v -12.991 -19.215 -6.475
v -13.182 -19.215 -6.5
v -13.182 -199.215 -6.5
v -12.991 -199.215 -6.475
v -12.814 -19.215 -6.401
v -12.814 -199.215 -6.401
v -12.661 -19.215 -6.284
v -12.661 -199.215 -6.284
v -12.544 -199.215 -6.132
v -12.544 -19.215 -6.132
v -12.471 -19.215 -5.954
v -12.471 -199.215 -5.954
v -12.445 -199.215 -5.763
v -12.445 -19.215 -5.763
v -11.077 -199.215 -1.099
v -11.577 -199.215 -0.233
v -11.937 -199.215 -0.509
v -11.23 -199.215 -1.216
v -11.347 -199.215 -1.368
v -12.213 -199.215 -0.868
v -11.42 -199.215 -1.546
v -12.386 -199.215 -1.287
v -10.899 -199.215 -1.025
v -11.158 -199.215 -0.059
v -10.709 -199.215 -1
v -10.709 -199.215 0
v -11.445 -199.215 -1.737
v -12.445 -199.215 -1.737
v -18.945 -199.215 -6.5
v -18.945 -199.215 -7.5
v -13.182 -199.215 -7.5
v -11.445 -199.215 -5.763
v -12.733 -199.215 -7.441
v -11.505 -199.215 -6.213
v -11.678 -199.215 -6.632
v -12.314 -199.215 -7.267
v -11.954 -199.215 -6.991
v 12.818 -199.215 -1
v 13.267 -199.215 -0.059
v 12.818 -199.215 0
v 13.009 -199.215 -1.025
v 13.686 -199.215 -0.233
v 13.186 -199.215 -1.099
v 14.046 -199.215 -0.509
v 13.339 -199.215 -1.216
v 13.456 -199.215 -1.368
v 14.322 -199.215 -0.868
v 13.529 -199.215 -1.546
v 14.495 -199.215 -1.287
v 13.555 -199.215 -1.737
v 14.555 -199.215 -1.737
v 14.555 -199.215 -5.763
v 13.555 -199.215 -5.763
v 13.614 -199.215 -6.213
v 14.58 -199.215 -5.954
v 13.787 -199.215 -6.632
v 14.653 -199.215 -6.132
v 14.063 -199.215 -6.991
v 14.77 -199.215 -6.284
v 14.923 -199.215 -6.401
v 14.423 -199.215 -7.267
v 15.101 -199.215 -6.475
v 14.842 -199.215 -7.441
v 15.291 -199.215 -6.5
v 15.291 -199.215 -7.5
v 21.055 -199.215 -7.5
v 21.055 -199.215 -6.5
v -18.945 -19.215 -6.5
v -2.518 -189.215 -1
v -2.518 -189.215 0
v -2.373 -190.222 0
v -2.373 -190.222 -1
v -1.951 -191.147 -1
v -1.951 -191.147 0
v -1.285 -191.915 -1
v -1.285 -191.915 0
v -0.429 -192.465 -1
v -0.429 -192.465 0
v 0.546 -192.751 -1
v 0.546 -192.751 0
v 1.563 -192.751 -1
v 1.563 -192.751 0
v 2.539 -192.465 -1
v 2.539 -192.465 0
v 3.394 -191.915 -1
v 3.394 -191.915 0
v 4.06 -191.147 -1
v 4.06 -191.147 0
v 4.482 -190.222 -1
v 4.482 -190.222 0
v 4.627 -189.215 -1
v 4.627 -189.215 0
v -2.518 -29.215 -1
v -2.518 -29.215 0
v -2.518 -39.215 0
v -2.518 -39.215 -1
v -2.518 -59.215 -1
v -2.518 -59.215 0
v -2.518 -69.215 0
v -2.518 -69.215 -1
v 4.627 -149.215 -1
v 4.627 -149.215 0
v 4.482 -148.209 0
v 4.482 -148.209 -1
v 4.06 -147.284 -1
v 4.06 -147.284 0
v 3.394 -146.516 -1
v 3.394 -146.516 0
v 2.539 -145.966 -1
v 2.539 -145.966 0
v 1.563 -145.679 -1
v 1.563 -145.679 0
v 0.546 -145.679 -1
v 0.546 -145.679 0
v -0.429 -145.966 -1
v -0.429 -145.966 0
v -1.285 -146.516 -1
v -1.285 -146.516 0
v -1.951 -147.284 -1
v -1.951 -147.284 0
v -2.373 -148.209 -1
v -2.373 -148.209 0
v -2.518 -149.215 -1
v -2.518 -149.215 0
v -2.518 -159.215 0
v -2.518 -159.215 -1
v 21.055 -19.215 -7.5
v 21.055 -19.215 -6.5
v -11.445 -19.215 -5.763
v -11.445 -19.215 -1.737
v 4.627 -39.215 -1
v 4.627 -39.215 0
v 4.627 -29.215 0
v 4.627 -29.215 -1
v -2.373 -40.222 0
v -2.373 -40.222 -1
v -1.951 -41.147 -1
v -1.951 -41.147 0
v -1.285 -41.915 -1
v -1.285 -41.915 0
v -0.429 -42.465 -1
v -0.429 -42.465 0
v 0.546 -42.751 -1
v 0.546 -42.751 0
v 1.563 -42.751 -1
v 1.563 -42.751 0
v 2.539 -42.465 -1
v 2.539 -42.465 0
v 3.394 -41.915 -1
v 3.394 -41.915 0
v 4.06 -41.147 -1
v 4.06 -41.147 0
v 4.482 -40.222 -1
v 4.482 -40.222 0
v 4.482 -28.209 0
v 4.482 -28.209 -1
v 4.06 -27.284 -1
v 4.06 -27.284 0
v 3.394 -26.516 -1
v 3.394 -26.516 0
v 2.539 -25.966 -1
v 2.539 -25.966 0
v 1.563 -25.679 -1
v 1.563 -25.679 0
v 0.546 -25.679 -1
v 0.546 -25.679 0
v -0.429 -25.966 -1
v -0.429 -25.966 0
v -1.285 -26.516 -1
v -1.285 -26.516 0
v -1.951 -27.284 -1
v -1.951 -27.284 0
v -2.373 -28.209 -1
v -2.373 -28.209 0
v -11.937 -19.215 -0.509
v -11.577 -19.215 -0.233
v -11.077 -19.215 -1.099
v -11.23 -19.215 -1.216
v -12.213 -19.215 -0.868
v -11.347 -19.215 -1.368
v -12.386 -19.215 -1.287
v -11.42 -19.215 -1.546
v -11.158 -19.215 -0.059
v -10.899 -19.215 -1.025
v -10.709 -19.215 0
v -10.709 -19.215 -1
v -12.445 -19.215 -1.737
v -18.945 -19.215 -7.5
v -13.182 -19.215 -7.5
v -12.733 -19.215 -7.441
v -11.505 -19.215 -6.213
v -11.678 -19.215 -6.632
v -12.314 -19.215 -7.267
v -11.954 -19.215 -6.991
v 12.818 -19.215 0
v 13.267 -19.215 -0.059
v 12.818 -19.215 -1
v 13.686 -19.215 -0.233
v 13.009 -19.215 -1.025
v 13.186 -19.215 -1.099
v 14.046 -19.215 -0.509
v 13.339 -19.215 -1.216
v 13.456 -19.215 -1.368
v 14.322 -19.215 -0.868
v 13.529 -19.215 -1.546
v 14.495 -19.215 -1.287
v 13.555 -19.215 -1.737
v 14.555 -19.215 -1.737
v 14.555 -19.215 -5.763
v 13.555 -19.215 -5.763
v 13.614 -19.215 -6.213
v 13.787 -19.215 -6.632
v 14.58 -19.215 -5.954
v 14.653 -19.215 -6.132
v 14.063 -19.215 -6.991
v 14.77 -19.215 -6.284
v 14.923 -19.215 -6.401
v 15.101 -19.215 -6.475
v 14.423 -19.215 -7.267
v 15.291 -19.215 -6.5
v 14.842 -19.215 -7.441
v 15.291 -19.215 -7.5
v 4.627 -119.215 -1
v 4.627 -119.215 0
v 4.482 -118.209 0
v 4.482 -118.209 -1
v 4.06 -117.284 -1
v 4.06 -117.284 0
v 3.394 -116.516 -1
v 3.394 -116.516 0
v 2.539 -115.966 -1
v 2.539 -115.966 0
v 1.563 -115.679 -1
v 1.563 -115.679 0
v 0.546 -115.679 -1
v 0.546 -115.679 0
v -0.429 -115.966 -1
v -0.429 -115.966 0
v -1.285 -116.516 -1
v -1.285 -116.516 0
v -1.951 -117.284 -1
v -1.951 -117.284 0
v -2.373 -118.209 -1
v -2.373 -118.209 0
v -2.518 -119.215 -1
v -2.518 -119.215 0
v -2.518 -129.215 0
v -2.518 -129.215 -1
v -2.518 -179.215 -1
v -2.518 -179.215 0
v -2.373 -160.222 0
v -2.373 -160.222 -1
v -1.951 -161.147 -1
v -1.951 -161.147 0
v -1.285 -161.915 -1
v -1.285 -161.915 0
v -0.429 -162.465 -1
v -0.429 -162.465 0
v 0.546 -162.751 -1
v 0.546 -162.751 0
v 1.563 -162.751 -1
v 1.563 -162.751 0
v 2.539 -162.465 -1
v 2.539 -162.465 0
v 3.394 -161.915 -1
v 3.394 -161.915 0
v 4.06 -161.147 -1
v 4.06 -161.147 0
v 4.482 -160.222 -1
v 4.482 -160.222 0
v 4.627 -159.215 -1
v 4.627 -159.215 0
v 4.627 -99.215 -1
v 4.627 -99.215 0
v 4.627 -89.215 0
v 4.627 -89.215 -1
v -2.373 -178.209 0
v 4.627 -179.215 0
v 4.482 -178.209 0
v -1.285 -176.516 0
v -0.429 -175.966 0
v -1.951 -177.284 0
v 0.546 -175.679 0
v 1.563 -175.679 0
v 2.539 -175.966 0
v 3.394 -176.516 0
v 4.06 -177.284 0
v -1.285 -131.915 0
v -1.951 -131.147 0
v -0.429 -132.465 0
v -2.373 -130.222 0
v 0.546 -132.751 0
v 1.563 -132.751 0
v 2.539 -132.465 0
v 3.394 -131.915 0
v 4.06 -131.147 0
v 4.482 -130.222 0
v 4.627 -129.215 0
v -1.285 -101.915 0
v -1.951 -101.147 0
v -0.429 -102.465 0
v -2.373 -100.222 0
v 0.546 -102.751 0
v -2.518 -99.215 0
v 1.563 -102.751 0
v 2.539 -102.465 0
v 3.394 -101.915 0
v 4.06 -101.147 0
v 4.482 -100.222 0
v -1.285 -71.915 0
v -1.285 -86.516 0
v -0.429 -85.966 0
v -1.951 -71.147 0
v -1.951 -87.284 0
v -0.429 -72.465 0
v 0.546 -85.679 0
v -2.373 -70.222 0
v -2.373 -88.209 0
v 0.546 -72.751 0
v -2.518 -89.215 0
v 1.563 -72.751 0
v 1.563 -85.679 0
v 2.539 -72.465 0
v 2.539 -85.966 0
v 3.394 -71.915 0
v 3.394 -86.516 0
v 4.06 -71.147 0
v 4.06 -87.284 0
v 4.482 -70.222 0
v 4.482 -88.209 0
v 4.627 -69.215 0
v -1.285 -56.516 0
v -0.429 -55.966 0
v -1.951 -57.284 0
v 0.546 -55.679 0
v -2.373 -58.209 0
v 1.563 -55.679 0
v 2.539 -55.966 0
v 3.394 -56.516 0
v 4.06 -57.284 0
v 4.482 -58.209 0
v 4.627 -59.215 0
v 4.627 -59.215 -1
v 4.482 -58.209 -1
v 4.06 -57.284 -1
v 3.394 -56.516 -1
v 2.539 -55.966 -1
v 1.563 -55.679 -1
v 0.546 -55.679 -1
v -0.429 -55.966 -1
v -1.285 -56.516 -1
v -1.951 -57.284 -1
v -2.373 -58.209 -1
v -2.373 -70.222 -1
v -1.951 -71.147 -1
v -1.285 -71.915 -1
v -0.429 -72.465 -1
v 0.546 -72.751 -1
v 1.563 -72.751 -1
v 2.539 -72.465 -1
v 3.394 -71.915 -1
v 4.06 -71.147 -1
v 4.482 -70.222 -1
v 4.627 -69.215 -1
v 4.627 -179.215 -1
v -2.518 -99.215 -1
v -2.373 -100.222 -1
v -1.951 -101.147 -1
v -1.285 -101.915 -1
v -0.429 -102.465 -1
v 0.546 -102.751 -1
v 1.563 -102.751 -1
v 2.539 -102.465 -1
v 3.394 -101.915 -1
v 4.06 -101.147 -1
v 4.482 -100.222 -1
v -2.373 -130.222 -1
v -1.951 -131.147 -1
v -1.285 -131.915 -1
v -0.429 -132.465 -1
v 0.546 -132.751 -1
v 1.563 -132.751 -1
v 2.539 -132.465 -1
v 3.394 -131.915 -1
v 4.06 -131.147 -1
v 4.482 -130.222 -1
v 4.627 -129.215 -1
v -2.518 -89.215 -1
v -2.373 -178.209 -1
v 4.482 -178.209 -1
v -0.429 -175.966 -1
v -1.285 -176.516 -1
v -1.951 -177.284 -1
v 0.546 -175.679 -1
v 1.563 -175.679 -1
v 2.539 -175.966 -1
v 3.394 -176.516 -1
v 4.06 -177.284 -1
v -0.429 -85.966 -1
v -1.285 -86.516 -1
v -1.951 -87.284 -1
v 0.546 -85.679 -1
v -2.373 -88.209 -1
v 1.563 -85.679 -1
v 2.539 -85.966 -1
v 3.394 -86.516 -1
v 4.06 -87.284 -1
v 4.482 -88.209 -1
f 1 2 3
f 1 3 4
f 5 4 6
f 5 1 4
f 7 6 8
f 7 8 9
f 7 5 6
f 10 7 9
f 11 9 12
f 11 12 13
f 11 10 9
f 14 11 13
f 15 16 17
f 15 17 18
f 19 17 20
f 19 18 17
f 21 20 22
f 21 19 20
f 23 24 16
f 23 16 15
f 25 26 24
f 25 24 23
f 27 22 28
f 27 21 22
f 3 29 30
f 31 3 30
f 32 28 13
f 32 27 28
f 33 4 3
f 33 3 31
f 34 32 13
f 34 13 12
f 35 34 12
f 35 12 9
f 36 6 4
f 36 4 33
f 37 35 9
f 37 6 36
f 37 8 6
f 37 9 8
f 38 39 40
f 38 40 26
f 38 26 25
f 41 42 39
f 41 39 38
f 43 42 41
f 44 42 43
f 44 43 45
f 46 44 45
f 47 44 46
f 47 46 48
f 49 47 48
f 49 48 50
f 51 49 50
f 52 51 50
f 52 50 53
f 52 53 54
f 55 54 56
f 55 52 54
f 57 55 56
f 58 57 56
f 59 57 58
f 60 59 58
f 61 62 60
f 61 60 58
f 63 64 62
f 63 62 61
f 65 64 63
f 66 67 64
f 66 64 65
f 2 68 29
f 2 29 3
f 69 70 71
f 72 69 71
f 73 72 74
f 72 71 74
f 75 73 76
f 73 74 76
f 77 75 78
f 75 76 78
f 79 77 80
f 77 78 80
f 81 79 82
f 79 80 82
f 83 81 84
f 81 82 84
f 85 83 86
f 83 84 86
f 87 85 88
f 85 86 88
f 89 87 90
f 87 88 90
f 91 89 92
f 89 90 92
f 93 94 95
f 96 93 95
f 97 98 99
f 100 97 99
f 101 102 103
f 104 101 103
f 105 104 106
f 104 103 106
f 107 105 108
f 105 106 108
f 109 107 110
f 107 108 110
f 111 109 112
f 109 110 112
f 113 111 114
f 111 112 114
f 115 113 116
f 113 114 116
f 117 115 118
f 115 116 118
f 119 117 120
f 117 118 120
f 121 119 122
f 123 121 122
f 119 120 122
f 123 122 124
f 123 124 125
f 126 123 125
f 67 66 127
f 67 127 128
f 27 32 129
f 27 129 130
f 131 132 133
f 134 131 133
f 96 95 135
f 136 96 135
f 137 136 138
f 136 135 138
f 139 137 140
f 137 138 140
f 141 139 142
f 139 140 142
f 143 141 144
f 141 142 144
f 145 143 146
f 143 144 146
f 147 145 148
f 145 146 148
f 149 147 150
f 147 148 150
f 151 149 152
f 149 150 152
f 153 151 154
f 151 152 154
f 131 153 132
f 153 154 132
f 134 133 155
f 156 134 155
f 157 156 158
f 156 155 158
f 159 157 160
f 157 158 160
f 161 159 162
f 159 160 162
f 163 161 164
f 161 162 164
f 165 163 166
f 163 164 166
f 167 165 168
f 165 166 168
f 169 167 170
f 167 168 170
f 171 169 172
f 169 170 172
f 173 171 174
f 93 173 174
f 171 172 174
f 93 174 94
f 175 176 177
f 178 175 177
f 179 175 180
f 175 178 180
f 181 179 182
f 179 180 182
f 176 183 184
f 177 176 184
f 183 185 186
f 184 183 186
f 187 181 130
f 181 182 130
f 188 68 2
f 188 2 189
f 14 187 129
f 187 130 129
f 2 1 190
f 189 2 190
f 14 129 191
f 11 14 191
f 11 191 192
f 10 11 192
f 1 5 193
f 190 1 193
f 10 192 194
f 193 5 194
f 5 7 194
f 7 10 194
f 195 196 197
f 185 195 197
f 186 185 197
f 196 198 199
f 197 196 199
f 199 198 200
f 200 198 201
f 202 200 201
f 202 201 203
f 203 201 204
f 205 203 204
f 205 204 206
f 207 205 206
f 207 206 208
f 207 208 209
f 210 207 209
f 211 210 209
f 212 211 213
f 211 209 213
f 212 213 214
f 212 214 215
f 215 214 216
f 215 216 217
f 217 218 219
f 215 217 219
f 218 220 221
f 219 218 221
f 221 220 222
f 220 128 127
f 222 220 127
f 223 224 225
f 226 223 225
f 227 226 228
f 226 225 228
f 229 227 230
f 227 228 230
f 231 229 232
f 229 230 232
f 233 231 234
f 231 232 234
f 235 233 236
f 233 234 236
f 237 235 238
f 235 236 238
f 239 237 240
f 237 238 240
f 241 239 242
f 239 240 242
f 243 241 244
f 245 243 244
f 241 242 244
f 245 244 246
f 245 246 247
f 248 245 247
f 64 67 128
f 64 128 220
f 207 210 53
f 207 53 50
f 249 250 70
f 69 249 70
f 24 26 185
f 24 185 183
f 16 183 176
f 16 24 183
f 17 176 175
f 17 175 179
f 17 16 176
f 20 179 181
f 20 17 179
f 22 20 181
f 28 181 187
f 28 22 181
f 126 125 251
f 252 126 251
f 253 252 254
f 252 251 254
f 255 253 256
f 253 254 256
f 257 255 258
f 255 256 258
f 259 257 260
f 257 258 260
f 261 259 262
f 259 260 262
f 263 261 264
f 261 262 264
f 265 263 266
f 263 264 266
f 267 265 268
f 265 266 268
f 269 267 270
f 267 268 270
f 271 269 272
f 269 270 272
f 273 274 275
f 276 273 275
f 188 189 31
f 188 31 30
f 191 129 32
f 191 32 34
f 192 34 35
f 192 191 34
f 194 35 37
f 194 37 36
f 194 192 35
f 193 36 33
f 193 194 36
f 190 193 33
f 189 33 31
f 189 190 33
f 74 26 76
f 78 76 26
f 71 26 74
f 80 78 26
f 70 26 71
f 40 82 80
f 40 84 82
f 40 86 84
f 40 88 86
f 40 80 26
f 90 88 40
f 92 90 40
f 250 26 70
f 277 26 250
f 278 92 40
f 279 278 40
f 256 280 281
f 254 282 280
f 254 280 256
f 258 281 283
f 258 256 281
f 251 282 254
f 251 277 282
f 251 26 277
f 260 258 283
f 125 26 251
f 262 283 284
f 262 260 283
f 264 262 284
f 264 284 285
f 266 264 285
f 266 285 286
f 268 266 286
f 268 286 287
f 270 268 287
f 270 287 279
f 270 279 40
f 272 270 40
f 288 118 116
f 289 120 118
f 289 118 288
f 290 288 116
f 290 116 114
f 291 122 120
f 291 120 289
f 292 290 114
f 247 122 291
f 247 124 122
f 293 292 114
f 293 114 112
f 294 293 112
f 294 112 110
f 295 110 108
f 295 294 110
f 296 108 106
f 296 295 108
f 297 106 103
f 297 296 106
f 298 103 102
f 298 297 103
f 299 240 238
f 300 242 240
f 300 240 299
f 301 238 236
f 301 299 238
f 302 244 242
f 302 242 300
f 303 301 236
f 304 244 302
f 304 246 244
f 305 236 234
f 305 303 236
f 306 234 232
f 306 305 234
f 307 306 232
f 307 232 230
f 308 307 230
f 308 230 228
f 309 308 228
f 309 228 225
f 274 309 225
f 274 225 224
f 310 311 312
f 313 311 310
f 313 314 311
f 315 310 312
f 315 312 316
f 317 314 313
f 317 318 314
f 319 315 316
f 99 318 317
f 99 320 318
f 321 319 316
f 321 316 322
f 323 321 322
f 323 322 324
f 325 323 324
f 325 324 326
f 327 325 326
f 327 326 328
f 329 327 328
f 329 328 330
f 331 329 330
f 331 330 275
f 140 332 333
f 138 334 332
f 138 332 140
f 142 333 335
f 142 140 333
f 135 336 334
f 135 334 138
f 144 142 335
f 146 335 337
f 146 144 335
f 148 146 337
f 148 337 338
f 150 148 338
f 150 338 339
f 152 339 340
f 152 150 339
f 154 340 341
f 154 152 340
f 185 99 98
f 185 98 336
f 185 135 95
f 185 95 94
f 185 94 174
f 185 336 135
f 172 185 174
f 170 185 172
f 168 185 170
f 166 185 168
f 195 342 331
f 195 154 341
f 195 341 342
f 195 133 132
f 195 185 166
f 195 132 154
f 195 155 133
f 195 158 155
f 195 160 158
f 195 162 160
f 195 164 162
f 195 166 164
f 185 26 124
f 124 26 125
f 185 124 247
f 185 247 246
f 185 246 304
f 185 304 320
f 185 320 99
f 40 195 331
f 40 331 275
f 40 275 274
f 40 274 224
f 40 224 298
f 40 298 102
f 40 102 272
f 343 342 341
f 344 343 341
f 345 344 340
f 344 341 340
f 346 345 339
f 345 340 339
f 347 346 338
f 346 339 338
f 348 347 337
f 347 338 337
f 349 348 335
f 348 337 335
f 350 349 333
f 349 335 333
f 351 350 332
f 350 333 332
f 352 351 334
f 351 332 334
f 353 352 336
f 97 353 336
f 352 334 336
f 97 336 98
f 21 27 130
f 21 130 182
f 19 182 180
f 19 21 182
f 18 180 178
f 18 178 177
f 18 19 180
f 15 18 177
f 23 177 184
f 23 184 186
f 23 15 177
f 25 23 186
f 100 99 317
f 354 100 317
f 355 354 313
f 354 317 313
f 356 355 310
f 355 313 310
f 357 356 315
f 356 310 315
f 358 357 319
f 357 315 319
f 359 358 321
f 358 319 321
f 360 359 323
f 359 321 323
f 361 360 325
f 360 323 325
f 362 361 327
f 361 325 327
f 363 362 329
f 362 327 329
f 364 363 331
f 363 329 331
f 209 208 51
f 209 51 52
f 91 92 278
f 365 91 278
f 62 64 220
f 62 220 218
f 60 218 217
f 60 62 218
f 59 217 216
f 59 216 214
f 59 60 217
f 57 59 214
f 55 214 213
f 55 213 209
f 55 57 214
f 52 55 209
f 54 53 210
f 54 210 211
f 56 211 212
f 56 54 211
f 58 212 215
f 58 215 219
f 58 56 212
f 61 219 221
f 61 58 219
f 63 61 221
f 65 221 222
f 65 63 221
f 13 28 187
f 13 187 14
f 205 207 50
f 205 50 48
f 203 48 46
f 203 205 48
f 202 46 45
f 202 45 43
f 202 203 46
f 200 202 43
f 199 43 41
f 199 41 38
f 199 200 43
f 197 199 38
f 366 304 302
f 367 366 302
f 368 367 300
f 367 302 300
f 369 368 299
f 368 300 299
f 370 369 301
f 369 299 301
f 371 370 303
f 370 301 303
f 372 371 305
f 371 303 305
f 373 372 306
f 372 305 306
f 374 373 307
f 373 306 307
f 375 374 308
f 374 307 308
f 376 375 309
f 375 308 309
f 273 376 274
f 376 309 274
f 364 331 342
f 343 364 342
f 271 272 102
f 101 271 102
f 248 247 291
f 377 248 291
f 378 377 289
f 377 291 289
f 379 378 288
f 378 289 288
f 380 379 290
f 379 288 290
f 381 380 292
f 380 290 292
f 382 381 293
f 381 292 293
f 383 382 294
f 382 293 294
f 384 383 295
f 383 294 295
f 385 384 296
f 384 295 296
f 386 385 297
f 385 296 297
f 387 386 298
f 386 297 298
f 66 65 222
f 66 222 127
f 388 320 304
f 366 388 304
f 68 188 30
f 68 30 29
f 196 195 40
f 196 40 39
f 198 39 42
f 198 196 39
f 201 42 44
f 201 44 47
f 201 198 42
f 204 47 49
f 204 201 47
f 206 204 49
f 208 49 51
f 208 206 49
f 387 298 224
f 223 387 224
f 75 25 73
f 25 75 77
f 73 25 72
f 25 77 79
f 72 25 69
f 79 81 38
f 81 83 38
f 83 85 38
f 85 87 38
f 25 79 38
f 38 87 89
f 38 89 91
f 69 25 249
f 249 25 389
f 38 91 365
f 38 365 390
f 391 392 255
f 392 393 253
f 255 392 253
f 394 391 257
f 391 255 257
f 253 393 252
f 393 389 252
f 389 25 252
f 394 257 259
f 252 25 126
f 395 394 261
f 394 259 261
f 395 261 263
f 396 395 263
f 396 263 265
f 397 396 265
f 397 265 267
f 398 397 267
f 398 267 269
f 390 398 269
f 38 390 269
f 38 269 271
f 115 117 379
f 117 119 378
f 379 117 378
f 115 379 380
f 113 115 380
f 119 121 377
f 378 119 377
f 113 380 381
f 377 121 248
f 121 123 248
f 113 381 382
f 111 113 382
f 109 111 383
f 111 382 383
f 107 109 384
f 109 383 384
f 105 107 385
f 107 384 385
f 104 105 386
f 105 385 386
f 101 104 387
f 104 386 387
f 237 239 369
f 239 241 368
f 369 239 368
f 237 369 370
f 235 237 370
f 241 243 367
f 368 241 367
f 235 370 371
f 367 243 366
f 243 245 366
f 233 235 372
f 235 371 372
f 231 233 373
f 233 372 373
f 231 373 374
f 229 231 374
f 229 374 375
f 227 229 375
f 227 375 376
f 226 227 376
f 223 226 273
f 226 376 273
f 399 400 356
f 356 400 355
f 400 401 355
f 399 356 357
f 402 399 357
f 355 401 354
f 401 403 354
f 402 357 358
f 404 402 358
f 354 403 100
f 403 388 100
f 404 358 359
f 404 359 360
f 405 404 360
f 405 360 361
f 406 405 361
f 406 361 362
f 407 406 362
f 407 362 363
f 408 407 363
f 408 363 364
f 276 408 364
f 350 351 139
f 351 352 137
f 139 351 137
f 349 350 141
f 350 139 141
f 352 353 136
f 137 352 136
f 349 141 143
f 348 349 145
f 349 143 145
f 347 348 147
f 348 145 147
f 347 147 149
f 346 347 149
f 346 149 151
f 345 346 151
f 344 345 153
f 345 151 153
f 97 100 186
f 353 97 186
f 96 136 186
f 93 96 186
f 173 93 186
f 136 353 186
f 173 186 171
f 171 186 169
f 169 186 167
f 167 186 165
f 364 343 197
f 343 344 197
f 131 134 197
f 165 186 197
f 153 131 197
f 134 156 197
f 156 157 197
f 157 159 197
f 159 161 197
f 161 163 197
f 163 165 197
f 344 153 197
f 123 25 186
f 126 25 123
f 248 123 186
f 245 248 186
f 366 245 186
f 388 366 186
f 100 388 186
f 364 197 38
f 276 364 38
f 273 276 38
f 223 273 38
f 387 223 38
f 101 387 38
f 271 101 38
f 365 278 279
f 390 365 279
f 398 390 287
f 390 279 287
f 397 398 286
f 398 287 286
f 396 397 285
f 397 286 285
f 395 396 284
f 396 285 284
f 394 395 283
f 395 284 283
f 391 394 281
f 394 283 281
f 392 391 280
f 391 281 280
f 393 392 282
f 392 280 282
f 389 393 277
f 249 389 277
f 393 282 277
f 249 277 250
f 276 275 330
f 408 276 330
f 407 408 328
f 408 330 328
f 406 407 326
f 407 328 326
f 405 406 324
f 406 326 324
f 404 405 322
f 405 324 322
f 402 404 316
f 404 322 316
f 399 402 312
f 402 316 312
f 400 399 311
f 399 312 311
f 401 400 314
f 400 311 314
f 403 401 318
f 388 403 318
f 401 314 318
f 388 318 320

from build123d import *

# Parameters (mm, degrees)
SKETCH_2_W                         = 27
SKETCH_2_H                         = 180
SM_BASE_FLANGE_1_DEPTH             = 1
SM_EDGE_FLANGE_1_STRIP_W           = 5.4732
SM_EDGE_FLANGE_1_STRIP_H           = 1
SM_EDGE_FLANGE_1_STRIP_CUT_DEPTH   = 180
SM_EDGE_FLANGE_1_STRIP_2_W         = 5.4732
SM_EDGE_FLANGE_1_STRIP_2_H         = 1
SM_EDGE_FLANGE_1_STRIP_CUT_2_DEPTH = 180
SM_EDGE_FLANGE_1_DEPTH             = 180
SM_EDGE_FLANGE_1_BEND_DEPTH        = 180
SM_EDGE_FLANGE_2_STRIP_W           = 5.4732
SM_EDGE_FLANGE_2_STRIP_H           = 1
SM_EDGE_FLANGE_2_STRIP_CUT_DEPTH   = 180
SM_EDGE_FLANGE_2_STRIP_2_W         = 5.4732
SM_EDGE_FLANGE_2_STRIP_2_H         = 1
SM_EDGE_FLANGE_2_STRIP_CUT_2_DEPTH = 180
SM_EDGE_FLANGE_2_DEPTH             = 180
SM_EDGE_FLANGE_2_BEND_DEPTH        = 180
CUT_EXTRUDE_3_DEPTH                = 10
PATTERN_LINEAR_1_COUNT             = 9
PATTERN_LINEAR_1_PITCH             = 30


# Sheet-metal steps are written as plain solids
with BuildPart() as part:
    # 草图2 → 基体-法兰1 (new body)
    with BuildSketch(Plane.XY):
        with Locations((1.054557063, -109.215322961)):
            Rectangle(SKETCH_2_W, SKETCH_2_H)
    extrude(amount=-SM_BASE_FLANGE_1_DEPTH)

    # 边线-法兰1 strip (across the edge) → 边线-法兰1 strip cut (cut)
    with BuildSketch(Plane(origin=(-12.445442937, -199.215322961, -1), x_dir=(1, 0, 0), z_dir=(0, 1, 0))):
        with Locations((-1, -0.5)):
            Rectangle(SM_EDGE_FLANGE_1_STRIP_W, SM_EDGE_FLANGE_1_STRIP_H)
    extrude(amount=SM_EDGE_FLANGE_1_STRIP_CUT_DEPTH, mode=Mode.SUBTRACT)

    # 边线-法兰1 strip 2 (across the edge) → 边线-法兰1 strip cut 2 (cut)
    with BuildSketch(Plane(origin=(14.554557063, -19.215322961, -1), x_dir=(-1, 0, 0), z_dir=(0, -1, 0))):
        with Locations((-1, -0.5)):
            Rectangle(SM_EDGE_FLANGE_1_STRIP_2_W, SM_EDGE_FLANGE_1_STRIP_2_H)
    extrude(amount=SM_EDGE_FLANGE_1_STRIP_CUT_2_DEPTH, mode=Mode.SUBTRACT)

    # 边线-法兰1 section (across the edge) → 边线-法兰1 (add)
    with BuildSketch(Plane(origin=(-12.445442937, -199.215322961, -1), x_dir=(1, 0, 0), z_dir=(0, 1, 0))):
        with BuildLine():
            Line((0, 0.7366), (0, 6.5))
            Line((0, 6.5), (1, 6.5))
            Line((1, 6.5), (1, 0.7366))
            ThreePointArc((1, 0.7366), (1.215745145, 0.215745145), (1.7366, 0))
            Line((1.7366, 0), (1.7366, -1))
            ThreePointArc((1.7366, -1), (0.508638364, -0.491361636), (0, 0.7366))
        make_face()
    extrude(amount=SM_EDGE_FLANGE_1_DEPTH)

    # 边线-法兰1 section 2 (across the edge) → 边线-法兰1 bend (add)
    with BuildSketch(Plane(origin=(14.554557063, -19.215322961, -1), x_dir=(-1, 0, 0), z_dir=(0, -1, 0))):
        with BuildLine():
            Line((0, 0.7366), (0, 6.5))
            Line((0, 6.5), (1, 6.5))
            Line((1, 6.5), (1, 0.7366))
            ThreePointArc((1, 0.7366), (1.215745145, 0.215745145), (1.7366, 0))
            Line((1.7366, 0), (1.7366, -1))
            ThreePointArc((1.7366, -1), (0.508638364, -0.491361636), (0, 0.7366))
        make_face()
    extrude(amount=SM_EDGE_FLANGE_1_BEND_DEPTH)

    # 边线-法兰2 strip (across the edge) → 边线-法兰2 strip cut (cut)
    with BuildSketch(Plane(origin=(-12.445442937, -19.215322961, -7.5), x_dir=(0, 0, 1), z_dir=(0, -1, 0))):
        with Locations((-1, -0.5)):
            Rectangle(SM_EDGE_FLANGE_2_STRIP_W, SM_EDGE_FLANGE_2_STRIP_H)
    extrude(amount=SM_EDGE_FLANGE_2_STRIP_CUT_DEPTH, mode=Mode.SUBTRACT)

    # 边线-法兰2 strip 2 (across the edge) → 边线-法兰2 strip cut 2 (cut)
    with BuildSketch(Plane(origin=(14.554557063, -199.215322961, -7.5), x_dir=(0, 0, 1), z_dir=(0, 1, 0))):
        with Locations((-1, -0.5)):
            Rectangle(SM_EDGE_FLANGE_2_STRIP_2_W, SM_EDGE_FLANGE_2_STRIP_2_H)
    extrude(amount=SM_EDGE_FLANGE_2_STRIP_CUT_2_DEPTH, mode=Mode.SUBTRACT)

    # 边线-法兰2 section (across the edge) → 边线-法兰2 (add)
    with BuildSketch(Plane(origin=(-12.445442937, -19.215322961, -7.5), x_dir=(0, 0, 1), z_dir=(0, -1, 0))):
        with BuildLine():
            Line((0, 0.7366), (0, 6.5))
            Line((0, 6.5), (1, 6.5))
            Line((1, 6.5), (1, 0.7366))
            ThreePointArc((1, 0.7366), (1.215745145, 0.215745145), (1.7366, 0))
            Line((1.7366, 0), (1.7366, -1))
            ThreePointArc((1.7366, -1), (0.508638364, -0.491361636), (0, 0.7366))
        make_face()
    extrude(amount=SM_EDGE_FLANGE_2_DEPTH)

    # 边线-法兰2 section 2 (across the edge) → 边线-法兰2 bend (add)
    with BuildSketch(Plane(origin=(14.554557063, -199.215322961, -7.5), x_dir=(0, 0, 1), z_dir=(0, 1, 0))):
        with BuildLine():
            Line((0, 0.7366), (0, 6.5))
            Line((0, 6.5), (1, 6.5))
            Line((1, 6.5), (1, 0.7366))
            ThreePointArc((1, 0.7366), (1.215745145, 0.215745145), (1.7366, 0))
            Line((1.7366, 0), (1.7366, -1))
            ThreePointArc((1.7366, -1), (0.508638364, -0.491361636), (0, 0.7366))
        make_face()
    extrude(amount=SM_EDGE_FLANGE_2_BEND_DEPTH)

    # 草图17 → 切除-拉伸3 (cut)
    with BuildSketch(Plane.XY):
        with BuildLine():
            Line((4.626807443, -189.215322961), (4.626807443, -179.215322961))
            ThreePointArc((4.626807443, -179.215322961), (1.054557063, -175.643072581), (-2.517693316, -179.215322961))
            Line((-2.517693316, -179.215322961), (-2.517693316, -189.215322961))
            ThreePointArc((-2.517693316, -189.215322961), (1.054557063, -192.78757334), (4.626807443, -189.215322961))
        make_face()
    cut_extrude_3 = extrude(amount=-CUT_EXTRUDE_3_DEPTH, mode=Mode.SUBTRACT)

    # 阵列(线性)1: 切除-拉伸3 ×9
    with Locations(*[(0, i * PATTERN_LINEAR_1_PITCH, 0) for i in range(1, PATTERN_LINEAR_1_COUNT)]):
        add(cut_extrude_3, mode=Mode.SUBTRACT)


solid = part.part
